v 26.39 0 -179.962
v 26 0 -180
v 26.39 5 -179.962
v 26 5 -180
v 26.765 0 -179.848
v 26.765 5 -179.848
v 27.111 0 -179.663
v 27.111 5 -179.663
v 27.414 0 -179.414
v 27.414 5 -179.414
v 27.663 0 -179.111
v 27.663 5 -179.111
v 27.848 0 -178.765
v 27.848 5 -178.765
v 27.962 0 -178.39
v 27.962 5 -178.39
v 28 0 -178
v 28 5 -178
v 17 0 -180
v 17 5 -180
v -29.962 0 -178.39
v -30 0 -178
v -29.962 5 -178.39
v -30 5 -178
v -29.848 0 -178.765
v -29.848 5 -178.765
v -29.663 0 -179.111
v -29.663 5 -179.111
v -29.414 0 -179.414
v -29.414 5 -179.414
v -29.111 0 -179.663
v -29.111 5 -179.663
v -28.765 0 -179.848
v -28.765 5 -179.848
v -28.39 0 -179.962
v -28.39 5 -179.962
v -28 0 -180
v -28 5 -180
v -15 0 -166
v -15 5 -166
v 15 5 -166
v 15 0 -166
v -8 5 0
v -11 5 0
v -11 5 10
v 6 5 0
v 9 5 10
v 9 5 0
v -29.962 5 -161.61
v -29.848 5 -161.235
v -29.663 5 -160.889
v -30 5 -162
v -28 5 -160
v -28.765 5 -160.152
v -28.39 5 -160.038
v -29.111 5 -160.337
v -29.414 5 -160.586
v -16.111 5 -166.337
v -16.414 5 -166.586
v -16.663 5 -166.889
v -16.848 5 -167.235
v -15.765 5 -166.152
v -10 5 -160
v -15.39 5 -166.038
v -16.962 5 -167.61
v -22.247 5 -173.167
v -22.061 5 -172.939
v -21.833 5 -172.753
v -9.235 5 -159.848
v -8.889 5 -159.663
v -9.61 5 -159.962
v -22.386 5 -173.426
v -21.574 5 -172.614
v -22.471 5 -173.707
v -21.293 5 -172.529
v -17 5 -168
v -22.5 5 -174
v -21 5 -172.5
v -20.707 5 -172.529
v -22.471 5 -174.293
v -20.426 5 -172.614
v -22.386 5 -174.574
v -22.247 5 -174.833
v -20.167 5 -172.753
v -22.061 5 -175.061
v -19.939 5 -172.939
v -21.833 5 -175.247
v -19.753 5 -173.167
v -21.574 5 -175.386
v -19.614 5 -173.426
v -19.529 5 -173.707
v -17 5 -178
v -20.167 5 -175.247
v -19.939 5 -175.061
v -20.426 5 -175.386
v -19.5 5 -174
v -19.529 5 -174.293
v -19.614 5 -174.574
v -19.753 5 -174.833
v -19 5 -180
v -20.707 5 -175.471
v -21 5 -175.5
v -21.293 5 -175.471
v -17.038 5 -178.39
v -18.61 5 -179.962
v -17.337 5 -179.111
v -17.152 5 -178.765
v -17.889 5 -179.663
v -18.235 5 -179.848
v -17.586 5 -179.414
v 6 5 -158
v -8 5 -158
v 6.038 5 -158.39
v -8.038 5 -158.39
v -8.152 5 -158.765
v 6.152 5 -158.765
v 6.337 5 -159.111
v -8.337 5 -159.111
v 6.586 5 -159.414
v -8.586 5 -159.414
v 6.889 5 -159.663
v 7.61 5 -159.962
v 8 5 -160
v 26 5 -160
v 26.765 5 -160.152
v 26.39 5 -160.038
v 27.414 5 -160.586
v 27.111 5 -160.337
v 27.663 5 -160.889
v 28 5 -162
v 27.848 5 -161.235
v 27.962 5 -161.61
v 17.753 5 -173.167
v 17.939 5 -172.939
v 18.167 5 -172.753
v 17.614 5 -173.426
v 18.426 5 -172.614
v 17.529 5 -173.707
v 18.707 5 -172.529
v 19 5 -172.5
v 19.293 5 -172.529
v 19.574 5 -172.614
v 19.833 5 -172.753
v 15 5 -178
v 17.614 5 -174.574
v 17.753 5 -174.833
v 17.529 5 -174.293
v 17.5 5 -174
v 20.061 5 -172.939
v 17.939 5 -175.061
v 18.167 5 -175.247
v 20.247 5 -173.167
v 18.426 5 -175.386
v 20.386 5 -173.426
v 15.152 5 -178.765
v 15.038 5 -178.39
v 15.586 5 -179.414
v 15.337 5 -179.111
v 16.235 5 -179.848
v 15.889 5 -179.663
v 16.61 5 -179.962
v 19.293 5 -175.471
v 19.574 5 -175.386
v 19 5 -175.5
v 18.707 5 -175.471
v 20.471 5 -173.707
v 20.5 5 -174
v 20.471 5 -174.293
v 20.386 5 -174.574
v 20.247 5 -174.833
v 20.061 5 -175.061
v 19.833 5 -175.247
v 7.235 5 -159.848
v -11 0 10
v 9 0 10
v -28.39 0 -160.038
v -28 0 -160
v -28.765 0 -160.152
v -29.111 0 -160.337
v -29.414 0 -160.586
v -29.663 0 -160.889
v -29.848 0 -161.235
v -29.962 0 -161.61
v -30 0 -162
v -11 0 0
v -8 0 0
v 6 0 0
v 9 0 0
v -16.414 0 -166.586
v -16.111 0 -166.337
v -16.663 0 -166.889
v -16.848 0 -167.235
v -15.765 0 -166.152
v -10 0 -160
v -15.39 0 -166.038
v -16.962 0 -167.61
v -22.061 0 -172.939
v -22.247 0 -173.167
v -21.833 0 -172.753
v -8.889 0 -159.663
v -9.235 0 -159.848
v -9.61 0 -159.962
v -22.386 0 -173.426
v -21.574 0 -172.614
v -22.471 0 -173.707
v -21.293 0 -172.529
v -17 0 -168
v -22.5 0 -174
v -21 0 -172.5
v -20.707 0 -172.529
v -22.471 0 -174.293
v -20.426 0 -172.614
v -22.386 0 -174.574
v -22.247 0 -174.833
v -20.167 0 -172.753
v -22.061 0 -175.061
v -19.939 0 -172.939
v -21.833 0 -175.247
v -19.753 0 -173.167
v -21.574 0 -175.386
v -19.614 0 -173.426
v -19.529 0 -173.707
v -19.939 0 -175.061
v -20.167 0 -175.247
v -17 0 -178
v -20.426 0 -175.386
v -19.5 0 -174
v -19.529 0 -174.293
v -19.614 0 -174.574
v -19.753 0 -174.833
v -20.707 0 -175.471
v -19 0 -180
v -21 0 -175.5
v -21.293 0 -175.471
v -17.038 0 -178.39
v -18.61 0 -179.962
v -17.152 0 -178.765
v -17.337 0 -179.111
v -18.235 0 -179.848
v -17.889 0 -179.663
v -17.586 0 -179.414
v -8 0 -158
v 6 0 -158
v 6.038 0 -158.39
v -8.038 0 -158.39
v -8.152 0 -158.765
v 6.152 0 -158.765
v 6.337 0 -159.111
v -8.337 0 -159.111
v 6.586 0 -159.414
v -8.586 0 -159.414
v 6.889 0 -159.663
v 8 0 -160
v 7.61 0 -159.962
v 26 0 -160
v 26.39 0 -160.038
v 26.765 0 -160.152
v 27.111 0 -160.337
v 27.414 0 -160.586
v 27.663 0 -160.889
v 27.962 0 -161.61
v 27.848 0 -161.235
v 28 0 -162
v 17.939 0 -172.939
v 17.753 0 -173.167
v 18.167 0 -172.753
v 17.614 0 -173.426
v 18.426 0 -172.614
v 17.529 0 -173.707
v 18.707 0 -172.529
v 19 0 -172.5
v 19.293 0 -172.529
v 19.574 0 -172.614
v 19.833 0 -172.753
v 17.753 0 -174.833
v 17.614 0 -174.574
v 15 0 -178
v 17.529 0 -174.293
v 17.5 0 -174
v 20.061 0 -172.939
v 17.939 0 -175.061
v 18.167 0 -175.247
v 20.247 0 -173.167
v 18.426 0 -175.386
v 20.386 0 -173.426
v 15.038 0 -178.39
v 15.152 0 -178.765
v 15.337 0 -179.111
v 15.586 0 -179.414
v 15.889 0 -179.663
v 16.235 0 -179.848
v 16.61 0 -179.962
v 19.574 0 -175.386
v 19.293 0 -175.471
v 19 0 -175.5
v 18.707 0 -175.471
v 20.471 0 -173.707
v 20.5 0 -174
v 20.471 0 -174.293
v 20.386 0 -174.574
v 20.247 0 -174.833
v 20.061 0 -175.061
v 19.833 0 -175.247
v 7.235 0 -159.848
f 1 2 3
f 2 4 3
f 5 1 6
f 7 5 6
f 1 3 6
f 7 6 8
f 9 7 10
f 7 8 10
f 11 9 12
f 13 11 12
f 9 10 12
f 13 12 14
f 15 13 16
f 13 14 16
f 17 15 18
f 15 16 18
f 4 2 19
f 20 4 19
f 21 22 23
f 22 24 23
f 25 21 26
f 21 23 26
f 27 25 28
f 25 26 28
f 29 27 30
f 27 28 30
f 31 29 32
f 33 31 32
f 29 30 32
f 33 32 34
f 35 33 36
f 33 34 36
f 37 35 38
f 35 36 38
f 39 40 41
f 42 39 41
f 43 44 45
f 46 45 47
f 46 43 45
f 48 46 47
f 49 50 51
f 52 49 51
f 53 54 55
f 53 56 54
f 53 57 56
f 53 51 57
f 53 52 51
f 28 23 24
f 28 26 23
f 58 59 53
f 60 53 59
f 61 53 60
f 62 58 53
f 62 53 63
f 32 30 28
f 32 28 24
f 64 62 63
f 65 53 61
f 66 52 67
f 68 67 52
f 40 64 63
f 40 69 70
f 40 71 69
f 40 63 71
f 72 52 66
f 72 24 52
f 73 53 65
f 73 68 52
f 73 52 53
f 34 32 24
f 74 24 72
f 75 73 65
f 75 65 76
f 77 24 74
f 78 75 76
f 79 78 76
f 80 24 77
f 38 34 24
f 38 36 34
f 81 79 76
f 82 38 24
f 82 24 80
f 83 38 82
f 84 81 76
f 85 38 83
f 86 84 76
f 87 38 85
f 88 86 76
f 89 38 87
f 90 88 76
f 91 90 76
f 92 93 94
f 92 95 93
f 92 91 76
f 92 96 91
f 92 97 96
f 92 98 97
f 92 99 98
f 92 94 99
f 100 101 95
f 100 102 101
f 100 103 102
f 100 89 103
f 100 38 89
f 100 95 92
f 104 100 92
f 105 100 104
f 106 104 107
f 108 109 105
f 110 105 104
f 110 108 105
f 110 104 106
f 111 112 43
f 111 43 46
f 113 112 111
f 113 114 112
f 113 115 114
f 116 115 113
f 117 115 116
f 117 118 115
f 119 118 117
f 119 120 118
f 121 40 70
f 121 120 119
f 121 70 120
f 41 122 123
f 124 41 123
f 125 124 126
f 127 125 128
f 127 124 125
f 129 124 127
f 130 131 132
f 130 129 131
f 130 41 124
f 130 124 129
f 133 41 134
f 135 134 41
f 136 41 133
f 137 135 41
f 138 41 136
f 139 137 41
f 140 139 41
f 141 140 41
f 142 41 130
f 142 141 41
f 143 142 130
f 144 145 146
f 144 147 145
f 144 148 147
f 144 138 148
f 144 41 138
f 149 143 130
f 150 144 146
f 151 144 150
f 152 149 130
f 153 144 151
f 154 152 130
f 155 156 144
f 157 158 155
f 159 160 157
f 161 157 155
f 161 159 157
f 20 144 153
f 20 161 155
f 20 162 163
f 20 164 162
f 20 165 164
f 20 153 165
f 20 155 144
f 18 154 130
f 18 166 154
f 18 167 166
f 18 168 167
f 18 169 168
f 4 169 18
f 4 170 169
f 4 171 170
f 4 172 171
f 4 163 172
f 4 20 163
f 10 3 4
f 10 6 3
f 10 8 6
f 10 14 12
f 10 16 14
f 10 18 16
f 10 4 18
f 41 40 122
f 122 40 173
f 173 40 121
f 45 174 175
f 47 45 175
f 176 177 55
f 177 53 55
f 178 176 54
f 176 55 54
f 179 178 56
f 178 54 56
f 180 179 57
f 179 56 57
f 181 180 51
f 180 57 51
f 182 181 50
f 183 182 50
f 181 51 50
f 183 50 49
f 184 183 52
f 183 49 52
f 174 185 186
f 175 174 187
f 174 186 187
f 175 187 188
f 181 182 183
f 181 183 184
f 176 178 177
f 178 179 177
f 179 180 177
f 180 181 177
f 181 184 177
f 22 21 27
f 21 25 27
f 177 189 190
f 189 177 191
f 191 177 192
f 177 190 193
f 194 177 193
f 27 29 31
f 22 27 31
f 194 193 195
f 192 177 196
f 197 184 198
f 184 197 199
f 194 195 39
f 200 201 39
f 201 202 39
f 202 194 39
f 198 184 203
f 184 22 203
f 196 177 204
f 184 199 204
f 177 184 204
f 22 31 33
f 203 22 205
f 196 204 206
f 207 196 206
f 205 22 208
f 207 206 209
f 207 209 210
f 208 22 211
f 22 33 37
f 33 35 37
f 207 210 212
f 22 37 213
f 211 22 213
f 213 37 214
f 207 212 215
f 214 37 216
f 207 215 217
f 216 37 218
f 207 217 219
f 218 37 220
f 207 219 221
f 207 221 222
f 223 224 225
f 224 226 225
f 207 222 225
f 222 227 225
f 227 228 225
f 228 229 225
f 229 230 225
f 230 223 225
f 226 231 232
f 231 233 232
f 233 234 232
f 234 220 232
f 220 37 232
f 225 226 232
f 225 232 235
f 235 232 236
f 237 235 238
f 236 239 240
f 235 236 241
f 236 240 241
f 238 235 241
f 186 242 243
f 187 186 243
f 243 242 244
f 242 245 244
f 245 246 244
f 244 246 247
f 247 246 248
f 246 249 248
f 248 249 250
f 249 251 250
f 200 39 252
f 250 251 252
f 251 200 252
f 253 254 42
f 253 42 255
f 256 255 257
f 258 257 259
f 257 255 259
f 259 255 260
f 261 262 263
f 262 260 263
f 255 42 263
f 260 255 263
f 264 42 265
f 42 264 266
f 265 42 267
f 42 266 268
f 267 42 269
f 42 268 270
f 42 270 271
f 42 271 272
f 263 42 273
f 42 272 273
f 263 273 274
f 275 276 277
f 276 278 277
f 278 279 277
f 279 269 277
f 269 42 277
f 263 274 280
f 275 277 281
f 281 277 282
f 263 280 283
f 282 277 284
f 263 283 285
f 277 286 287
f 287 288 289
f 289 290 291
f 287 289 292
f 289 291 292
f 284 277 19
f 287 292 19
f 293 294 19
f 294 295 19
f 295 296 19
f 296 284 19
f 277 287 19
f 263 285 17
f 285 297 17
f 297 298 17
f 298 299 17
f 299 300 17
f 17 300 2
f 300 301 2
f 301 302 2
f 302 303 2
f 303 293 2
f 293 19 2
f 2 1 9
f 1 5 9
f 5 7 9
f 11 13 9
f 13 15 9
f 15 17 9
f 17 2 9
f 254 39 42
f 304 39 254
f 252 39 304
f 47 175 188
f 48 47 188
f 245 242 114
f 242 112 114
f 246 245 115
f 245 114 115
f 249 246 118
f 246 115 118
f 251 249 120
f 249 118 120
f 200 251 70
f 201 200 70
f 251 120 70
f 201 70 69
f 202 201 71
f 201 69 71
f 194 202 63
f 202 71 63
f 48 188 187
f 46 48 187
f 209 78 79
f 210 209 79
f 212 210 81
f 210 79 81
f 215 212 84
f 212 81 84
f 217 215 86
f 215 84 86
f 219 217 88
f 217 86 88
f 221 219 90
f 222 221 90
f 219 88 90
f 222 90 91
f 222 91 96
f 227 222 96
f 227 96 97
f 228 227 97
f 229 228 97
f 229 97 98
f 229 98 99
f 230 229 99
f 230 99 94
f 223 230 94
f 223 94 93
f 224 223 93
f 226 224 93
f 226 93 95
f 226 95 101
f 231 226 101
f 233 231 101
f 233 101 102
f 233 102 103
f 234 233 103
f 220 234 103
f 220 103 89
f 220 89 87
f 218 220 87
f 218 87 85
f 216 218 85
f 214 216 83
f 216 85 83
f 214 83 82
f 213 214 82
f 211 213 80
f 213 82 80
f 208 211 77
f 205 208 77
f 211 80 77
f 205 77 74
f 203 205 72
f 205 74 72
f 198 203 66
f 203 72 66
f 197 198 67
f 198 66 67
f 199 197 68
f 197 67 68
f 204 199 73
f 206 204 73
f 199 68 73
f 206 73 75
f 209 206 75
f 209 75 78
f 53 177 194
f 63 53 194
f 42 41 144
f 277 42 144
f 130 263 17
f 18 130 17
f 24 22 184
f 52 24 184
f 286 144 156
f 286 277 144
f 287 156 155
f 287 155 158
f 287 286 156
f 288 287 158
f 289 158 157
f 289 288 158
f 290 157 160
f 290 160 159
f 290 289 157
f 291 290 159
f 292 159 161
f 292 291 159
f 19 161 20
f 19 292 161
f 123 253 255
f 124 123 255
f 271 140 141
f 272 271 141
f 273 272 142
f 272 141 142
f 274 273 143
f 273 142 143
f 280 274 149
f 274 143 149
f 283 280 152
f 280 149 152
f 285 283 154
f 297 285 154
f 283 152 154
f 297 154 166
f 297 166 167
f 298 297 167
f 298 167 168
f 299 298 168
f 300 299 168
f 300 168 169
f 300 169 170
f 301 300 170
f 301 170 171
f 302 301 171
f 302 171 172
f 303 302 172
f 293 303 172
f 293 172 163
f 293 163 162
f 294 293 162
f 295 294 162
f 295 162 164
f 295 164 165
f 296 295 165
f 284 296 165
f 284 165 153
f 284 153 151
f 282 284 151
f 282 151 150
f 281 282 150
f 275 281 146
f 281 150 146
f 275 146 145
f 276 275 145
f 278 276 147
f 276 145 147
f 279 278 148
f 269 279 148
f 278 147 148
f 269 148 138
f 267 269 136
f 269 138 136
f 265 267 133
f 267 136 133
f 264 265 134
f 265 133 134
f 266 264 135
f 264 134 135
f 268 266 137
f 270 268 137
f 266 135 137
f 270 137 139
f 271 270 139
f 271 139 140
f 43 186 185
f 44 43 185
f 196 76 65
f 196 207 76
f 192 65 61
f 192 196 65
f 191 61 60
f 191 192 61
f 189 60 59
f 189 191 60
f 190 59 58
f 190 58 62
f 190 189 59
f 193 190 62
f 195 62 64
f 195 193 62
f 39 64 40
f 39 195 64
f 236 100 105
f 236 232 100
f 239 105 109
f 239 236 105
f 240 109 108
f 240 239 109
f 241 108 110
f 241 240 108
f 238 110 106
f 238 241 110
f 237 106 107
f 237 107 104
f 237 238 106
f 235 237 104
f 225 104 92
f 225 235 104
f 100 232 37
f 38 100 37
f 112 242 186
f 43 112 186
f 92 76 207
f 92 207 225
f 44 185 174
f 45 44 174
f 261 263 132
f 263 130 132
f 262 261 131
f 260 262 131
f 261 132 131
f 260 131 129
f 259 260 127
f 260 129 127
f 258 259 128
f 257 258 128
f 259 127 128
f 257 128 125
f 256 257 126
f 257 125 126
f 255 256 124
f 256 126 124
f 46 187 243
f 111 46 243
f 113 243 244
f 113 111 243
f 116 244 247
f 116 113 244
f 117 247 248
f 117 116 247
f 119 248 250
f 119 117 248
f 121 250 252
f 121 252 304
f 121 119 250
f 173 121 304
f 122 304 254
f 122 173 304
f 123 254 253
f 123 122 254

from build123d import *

# Parameters (mm, degrees)
BOSS_EXTRUDE1_DEPTH = 5
SKETCH2_R           = 1.5
SKETCH2_W           = 32
SKETCH2_H           = 14
CUT_EXTRUDE1_DEPTH  = 10
FILLET1_R           = 2


with BuildPart() as part:
    # Sketch1 → Boss-Extrude1 (new body)
    with BuildSketch(Plane(origin=(0, 0, 0), x_dir=(1, 0, 0), z_dir=(0, 1, 0))):
        Polygon((9, -10), (9, 0), (6, 0), (6, 160), (28, 160), (28, 180), (-30, 180), (-30, 160), (-8, 160), (-8, 0), (-11, 0), (-11, -10), align=None)
    extrude(amount=BOSS_EXTRUDE1_DEPTH)

    # Sketch2 → Cut-Extrude1 (cut)
    with BuildSketch(Plane(origin=(0, 5, 0), x_dir=(1, 0, 0), z_dir=(0, 1, 0))):
        with Locations(Location((-21, 174, 0), (0, 0, 270))):
            Circle(SKETCH2_R)
        with Locations(Location((19, 174, 0), (0, 0, 270))):
            Circle(SKETCH2_R)
        with Locations((-1, 173)):
            Rectangle(SKETCH2_W, SKETCH2_H)
    extrude(amount=-CUT_EXTRUDE1_DEPTH, mode=Mode.SUBTRACT)

    # Fillet1
    fillet1_edges = [part.edges().sort_by_distance(p)[0] for p in [
        (-8, 2.5, -160),
        (-30, 2.5, -160),
        (-30, 2.5, -180),
        (28, 2.5, -180),
        (28, 2.5, -160),
        (6, 2.5, -160),
        (15, 2.5, -180),
        (-17, 2.5, -166),
        (-17, 2.5, -180),
    ]]
    fillet(fillet1_edges, radius=FILLET1_R)


solid = part.part
